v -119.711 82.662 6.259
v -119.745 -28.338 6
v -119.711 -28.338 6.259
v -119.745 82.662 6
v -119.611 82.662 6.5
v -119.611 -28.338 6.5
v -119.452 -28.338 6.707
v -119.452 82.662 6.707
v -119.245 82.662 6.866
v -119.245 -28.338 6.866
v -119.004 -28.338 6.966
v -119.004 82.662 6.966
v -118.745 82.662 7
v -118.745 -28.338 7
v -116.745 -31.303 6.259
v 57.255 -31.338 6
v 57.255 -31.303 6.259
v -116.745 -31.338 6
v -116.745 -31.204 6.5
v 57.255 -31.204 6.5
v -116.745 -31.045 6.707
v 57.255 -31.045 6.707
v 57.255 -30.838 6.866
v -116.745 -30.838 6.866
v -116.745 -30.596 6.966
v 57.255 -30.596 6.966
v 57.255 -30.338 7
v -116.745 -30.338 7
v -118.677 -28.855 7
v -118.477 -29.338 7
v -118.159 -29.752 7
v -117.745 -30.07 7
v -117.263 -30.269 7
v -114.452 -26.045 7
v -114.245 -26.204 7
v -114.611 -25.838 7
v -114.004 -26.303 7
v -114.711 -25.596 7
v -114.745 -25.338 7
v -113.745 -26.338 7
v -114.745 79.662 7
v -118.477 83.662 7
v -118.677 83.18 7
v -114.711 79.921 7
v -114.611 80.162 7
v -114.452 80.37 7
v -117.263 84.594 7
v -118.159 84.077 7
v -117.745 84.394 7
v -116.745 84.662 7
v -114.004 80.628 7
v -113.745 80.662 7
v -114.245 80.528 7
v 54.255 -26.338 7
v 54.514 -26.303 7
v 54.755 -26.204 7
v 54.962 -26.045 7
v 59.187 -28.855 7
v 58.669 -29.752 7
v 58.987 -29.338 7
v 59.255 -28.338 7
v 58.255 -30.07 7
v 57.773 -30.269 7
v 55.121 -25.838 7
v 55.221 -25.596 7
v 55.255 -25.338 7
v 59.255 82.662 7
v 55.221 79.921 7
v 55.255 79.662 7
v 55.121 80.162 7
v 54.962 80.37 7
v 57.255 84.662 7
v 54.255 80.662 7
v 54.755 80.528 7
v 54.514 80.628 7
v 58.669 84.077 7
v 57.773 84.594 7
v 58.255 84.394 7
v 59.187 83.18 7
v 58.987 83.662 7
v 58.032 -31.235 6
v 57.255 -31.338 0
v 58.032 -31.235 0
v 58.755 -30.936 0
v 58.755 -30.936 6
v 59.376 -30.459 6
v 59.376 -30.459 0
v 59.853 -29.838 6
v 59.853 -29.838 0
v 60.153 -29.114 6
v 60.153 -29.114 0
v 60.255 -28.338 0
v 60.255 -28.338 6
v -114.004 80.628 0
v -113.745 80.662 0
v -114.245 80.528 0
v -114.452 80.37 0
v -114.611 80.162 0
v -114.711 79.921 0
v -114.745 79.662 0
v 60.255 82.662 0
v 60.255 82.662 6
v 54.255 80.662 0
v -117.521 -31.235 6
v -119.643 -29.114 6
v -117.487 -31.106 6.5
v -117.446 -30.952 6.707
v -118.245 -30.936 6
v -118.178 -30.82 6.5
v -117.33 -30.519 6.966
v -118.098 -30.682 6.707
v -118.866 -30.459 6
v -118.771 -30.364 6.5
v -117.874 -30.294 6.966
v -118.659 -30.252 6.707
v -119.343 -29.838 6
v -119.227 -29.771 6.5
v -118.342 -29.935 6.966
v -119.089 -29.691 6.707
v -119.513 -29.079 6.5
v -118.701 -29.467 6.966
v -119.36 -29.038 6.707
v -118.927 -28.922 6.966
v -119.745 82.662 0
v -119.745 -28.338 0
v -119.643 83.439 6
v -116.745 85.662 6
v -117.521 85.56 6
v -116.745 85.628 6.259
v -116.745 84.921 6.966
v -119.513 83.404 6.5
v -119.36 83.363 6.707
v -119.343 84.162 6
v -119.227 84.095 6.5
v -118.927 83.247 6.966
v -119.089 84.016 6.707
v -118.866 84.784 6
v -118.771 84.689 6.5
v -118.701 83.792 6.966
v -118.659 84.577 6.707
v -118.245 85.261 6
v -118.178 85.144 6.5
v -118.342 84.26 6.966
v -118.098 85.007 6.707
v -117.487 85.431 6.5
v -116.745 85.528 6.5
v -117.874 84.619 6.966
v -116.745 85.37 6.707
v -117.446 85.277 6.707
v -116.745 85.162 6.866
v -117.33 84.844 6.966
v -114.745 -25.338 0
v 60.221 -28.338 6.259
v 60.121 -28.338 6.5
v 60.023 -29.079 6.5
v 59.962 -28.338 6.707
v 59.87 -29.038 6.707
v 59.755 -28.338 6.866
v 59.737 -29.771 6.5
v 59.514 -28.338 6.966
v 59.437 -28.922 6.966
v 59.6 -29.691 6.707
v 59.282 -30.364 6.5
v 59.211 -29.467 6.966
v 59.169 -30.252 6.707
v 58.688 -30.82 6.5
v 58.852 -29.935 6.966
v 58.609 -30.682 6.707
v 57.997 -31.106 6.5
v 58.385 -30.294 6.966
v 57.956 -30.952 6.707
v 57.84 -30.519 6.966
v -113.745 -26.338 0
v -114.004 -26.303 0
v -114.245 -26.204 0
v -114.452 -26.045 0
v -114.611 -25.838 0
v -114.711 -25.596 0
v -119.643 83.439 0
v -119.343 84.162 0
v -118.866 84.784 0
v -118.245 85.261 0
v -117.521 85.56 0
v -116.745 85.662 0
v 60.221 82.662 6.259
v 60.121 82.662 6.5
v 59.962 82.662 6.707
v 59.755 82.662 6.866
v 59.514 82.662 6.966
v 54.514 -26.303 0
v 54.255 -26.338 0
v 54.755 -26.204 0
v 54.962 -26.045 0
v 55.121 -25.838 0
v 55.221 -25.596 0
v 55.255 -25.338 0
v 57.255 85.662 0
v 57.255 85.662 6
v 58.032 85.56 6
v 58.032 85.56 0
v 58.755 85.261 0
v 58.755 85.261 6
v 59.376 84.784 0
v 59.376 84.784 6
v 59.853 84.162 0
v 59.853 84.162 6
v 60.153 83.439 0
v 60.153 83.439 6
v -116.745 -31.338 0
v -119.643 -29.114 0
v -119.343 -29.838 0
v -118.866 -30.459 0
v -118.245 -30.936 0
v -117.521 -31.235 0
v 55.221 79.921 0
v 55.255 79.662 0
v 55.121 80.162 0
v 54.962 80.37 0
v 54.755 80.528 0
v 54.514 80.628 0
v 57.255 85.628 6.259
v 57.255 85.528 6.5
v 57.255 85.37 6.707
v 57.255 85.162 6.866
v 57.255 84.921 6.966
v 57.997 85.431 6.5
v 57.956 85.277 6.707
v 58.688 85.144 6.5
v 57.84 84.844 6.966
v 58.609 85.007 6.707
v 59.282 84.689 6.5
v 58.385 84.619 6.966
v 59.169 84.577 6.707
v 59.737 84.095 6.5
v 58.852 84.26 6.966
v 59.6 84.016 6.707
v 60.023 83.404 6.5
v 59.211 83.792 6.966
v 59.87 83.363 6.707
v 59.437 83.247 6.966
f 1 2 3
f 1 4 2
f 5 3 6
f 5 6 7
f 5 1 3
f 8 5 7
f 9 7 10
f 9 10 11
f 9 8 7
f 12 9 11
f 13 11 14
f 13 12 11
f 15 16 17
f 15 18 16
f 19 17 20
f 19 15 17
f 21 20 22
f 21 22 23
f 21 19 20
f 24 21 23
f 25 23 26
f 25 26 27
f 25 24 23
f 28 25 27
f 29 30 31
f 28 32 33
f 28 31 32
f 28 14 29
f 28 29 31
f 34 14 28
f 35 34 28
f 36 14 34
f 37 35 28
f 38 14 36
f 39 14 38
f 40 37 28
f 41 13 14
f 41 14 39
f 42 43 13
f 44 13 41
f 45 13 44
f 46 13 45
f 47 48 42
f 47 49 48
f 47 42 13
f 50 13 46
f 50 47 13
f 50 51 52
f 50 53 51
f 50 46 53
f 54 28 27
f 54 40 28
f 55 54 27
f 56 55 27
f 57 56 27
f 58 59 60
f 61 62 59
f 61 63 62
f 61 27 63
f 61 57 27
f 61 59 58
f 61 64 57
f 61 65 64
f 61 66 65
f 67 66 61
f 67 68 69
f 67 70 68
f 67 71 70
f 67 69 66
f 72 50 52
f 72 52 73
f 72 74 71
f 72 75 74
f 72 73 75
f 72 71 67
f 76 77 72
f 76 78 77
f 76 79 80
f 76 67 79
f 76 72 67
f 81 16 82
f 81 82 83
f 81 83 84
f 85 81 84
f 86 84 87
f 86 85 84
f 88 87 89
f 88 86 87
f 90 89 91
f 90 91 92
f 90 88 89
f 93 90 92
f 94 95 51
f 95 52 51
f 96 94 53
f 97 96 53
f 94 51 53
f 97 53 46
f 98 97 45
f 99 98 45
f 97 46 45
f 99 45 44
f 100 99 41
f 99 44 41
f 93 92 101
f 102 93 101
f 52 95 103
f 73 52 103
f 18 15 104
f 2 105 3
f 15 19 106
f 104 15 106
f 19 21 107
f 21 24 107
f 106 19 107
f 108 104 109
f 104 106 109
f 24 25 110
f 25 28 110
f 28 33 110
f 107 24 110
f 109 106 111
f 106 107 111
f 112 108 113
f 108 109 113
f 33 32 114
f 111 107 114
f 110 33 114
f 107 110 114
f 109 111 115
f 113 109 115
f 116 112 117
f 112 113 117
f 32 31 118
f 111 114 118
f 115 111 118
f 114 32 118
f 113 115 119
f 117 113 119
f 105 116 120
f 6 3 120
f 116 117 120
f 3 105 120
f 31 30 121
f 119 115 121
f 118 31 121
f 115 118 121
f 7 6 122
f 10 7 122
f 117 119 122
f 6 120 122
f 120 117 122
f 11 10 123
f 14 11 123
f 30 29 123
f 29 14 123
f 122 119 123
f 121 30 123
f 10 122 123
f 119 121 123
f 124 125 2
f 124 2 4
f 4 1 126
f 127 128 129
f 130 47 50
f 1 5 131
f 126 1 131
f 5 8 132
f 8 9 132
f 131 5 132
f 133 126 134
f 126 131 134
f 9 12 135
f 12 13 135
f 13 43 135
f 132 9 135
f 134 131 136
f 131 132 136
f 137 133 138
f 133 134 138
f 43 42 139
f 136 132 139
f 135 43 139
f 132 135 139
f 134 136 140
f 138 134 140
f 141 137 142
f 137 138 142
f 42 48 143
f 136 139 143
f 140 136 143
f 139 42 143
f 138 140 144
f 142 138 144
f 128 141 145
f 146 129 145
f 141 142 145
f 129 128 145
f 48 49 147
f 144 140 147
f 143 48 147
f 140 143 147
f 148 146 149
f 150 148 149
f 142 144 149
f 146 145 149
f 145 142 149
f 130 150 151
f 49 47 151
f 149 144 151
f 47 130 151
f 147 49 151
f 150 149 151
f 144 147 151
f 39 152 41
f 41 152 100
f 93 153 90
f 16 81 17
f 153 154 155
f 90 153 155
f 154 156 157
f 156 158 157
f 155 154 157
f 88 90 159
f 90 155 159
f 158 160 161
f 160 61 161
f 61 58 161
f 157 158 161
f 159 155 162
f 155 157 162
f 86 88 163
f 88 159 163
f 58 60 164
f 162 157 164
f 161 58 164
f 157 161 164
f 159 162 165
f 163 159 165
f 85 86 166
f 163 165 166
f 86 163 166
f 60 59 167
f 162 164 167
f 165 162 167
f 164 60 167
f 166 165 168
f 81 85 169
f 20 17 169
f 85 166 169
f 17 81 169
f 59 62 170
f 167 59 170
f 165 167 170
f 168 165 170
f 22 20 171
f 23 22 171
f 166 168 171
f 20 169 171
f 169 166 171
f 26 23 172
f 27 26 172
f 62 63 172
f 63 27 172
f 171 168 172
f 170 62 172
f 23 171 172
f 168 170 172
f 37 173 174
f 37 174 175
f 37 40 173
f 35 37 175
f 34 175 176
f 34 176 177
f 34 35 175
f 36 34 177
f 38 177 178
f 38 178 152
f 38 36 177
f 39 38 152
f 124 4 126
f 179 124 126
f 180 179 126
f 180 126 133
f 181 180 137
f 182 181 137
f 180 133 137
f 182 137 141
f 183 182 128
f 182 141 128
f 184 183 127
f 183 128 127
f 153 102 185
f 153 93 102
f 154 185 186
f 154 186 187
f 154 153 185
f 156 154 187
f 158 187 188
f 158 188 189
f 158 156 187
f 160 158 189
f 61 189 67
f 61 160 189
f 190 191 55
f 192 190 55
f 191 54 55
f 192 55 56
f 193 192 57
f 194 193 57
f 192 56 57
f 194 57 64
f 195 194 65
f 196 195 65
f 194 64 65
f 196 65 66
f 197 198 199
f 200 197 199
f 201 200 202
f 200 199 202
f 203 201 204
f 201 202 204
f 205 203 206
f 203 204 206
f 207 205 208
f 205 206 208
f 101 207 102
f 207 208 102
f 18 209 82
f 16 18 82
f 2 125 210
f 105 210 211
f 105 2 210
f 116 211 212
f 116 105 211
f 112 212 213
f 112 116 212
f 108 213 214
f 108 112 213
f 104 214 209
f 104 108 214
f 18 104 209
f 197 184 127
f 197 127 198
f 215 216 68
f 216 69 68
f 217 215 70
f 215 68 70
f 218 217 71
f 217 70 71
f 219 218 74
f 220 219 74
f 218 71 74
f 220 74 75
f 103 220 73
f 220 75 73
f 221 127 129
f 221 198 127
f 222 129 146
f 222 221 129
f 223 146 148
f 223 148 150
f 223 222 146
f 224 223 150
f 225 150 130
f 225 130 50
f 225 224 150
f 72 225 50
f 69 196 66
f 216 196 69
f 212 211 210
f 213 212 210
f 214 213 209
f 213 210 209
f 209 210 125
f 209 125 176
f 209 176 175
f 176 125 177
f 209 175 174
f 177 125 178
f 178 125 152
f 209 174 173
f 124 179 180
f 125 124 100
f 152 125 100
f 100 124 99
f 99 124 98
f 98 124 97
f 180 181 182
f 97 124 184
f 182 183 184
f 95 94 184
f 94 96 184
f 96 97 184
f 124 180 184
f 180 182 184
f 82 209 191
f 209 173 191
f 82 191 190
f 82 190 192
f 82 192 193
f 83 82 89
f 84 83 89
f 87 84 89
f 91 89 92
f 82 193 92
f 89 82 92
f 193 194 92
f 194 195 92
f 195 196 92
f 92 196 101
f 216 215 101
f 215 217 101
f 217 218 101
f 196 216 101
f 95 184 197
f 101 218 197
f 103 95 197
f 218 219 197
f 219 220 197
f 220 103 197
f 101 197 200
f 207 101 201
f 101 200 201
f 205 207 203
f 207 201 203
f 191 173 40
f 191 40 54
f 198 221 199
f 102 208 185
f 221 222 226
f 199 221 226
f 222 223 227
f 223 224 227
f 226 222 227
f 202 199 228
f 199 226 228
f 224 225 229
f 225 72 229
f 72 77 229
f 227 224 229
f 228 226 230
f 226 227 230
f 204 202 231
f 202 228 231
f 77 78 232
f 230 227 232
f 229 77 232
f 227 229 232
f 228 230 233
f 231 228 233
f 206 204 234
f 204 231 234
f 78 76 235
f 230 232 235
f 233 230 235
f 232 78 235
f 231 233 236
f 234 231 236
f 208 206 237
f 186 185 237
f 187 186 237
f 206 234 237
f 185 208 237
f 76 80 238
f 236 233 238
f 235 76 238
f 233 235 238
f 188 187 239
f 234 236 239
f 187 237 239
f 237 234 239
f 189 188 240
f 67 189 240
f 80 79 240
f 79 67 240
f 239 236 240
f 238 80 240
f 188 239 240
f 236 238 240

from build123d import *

# Parameters (mm, degrees)
F0_W     = 180
F0_H     = 117
F2_DEPTH = 7
F1_W     = 170
F1_H     = 107
F3_DEPTH = 25
F4_R     = 3
F5_R     = 1
F6_R     = 1


with BuildPart() as f2:
    # F0 (on Top) → F2 (new body)
    with BuildSketch(Plane.XY):
        with Locations((-29.744874835, 27.1624445021)):
            Rectangle(F0_W, F0_H)
    extrude(amount=F2_DEPTH)

    # F1 (on face) → F3 (cut)
    with BuildSketch(Plane.XY):
        with Locations((-29.744874835, 27.1624445021)):
            Rectangle(F1_W, F1_H)
    extrude(amount=F3_DEPTH, mode=Mode.SUBTRACT)

    # F4
    f4_edges = [f2.edges().sort_by_distance(p)[0] for p in [
        (60.255125, 85.662445, 3.5),
        (60.255125, -31.337555, 3.5),
        (-119.744875, -31.337555, 3.5),
        (-119.744875, 85.662445, 3.5),
    ]]
    fillet(f4_edges, radius=F4_R)

    # F5
    f5_edges = [f2.edges().sort_by_distance(p)[0] for p in [
        (-119.744875, 27.162445, 7),
        (-29.744875, -31.337555, 7),
        (-118.866195, -30.458876, 7),
    ]]
    fillet(f5_edges, radius=F5_R)

    # F6
    f6_edges = [f2.edges().sort_by_distance(p)[0] for p in [
        (55.255125, -26.337555, 3.5),
        (55.255125, 80.662445, 3.5),
        (-114.744875, 80.662445, 3.5),
        (-114.744875, -26.337555, 3.5),
    ]]
    fillet(f6_edges, radius=F6_R)


solid = f2.part
